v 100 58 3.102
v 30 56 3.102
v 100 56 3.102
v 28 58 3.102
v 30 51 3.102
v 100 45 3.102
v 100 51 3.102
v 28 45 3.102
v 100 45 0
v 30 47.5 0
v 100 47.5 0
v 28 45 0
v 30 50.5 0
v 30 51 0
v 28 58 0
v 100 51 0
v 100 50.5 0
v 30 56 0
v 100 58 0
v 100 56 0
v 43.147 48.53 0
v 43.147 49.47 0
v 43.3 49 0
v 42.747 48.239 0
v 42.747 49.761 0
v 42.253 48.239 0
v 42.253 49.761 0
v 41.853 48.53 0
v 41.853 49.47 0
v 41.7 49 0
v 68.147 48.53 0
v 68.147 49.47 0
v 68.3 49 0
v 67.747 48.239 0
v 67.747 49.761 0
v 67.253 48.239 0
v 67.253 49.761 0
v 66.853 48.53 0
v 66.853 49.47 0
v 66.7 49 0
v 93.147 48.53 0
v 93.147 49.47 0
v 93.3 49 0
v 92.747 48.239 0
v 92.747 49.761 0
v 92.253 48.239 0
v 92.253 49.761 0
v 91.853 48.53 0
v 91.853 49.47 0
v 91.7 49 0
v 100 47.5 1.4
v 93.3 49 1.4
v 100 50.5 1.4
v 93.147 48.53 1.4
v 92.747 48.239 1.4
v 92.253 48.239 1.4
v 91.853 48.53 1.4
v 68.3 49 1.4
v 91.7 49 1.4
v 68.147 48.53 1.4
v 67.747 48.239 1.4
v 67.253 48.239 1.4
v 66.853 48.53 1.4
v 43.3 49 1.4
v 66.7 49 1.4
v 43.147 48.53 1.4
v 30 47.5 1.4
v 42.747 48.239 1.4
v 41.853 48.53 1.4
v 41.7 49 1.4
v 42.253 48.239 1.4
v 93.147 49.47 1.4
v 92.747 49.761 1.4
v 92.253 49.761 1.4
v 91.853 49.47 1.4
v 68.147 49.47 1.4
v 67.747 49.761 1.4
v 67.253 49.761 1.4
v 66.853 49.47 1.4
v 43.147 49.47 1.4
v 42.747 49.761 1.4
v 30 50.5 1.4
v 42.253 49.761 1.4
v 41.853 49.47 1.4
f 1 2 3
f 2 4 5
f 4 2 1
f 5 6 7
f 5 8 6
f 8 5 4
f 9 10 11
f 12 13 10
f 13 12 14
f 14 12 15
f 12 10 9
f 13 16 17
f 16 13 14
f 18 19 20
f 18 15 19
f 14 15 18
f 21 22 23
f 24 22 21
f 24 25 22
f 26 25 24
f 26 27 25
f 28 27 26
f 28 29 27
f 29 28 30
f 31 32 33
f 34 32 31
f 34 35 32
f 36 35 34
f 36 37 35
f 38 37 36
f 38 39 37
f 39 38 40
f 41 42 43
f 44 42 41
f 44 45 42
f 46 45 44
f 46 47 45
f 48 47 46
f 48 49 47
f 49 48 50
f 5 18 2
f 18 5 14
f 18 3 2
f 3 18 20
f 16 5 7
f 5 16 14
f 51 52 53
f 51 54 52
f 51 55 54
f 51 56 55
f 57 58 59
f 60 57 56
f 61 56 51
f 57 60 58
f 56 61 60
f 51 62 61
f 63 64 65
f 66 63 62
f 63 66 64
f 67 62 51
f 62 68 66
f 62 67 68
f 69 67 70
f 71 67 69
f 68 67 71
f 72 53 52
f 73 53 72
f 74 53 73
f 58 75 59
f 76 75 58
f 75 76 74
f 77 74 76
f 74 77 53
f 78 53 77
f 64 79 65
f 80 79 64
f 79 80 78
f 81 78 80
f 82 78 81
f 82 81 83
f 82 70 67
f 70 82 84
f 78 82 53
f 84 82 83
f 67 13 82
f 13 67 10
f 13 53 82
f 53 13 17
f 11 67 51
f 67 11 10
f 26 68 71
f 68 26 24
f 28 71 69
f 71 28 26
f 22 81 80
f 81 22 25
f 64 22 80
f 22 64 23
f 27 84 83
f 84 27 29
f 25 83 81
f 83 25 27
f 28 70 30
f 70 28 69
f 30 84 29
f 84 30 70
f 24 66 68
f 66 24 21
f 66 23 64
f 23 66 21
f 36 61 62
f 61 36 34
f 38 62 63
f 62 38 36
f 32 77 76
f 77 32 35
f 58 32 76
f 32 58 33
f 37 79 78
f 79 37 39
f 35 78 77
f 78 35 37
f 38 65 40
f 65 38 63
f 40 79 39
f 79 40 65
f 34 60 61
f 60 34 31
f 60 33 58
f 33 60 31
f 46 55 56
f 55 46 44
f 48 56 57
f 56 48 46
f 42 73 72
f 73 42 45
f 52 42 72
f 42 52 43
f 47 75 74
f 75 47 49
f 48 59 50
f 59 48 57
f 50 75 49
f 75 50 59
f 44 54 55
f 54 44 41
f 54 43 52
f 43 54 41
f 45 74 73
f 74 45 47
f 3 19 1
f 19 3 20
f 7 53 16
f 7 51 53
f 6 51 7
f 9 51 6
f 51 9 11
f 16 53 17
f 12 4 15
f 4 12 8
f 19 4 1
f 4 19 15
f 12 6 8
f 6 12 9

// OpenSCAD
// file: lib/roundedcube.scad
// Source: https://danielupshaw.com/openscad-rounded-corners/
// Higher definition curves
$fs = 0.01;

module roundedcube(size = [1, 1, 1], center = false, radius = 0.5, apply_to = "all") {
	// If single value, convert to [x, y, z] vector
	size = (size[0] == undef) ? [size, size, size] : size;

	translate_min = radius;
	translate_xmax = size[0] - radius;
	translate_ymax = size[1] - radius;
	translate_zmax = size[2] - radius;

	diameter = radius * 2;

	module build_point(type = "sphere", rotate = [0, 0, 0]) {
		if (type == "sphere") {
			sphere(r = radius);
		} else if (type == "cylinder") {
			rotate(a = rotate)
			cylinder(h = diameter, r = radius, center = true);
		}
	}

	obj_translate = (center == false) ?
		[0, 0, 0] : [
			-(size[0] / 2),
			-(size[1] / 2),
			-(size[2] / 2)
		];

	translate(v = obj_translate) {
		hull() {
			for (translate_x = [translate_min, translate_xmax]) {
				x_at = (translate_x == translate_min) ? "min" : "max";
				for (translate_y = [translate_min, translate_ymax]) {
					y_at = (translate_y == translate_min) ? "min" : "max";
					for (translate_z = [translate_min, translate_zmax]) {
						z_at = (translate_z == translate_min) ? "min" : "max";

						translate(v = [translate_x, translate_y, translate_z])
						if (
							(apply_to == "all") ||
							(apply_to == "xmin" && x_at == "min") || (apply_to == "xmax" && x_at == "max") ||
							(apply_to == "ymin" && y_at == "min") || (apply_to == "ymax" && y_at == "max") ||
							(apply_to == "zmin" && z_at == "min") || (apply_to == "zmax" && z_at == "max")
						) {
							build_point("sphere");
						} else {
							rotate = 
								(apply_to == "xmin" || apply_to == "xmax" || apply_to == "x") ? [0, 90, 0] : (
								(apply_to == "ymin" || apply_to == "ymax" || apply_to == "y") ? [90, 90, 0] :
								[0, 0, 0]
							);
							build_point("cylinder", rotate);
						}
					}
				}
			}
		}
	}
}
// file: common.scad
CORNER_RADIUS = 2;
PANEL_THICKNESS = 1.6;
WIDTH = 150;
INNER_HEIGHT = 62;  // The length of the Teensy board
HEIGHT = INNER_HEIGHT + 2 * PANEL_THICKNESS;

SCREW_HEAD = 3.5; // radius of widest part of screw
SCREW_SHAFT = 1.5; // radius of shaft of screw
SCREW_POSITION_OFFSET = 6;
SCREW_DEPTH = 4;
SCREW1_X = SCREW_POSITION_OFFSET;        SCREW1_Y = SCREW_POSITION_OFFSET;
SCREW2_X = SCREW_POSITION_OFFSET;        SCREW2_Y = HEIGHT- SCREW_POSITION_OFFSET;
SCREW3_X = WIDTH-SCREW_POSITION_OFFSET;  SCREW3_Y = SCREW_POSITION_OFFSET;
SCREW4_X = WIDTH-SCREW_POSITION_OFFSET;  SCREW4_Y = HEIGHT-SCREW_POSITION_OFFSET;

//FIXME 
$fn = 30;
// main file
include <common.scad>
SKIRT_DEPTH = 20;
TOP_THICKNESS = 2*PANEL_THICKNESS;

BUTTON_DIAMETER = 15.7;
ENCODER_DIAMETER = 7.05;
HEADPHONE_DIAMETER = 6 + 0.5; // 0.5mm padding

NEOPIXEL_LEFT_END = 30;
NEOPIXEL_TOP_EDGE = 56;
NEOPIXEL_WIDTH = 5;
NEOPIXEL_LENGTH = 100.5;
NEOPIXEL_RESISTOR_WIDTH = 3;
NEOPIXEL_RESISTOR_DEPTH = 1.4;
NEOPIXEL_RESISTOR_GAP = 0.5;

SLOT_CENTERLINE_X = 21;
SLOT_CENTERLINE_DOWN = 12;
USB_PORT_WIDTH = 8 + 0.5; // 0.5mm padding
USB_PORT_HEIGHT = 3 + 0.5; // 0.5mm padding
MICROSD_WIDTH = 11 + 0.5; // 0.5mm padding 
MICROSD_HEIGHT = 1 + 0.5; // 0.5mm padding
STUD_THICKNESS = SCREW_POSITION_OFFSET+SCREW_HEAD-1;

//FIXME
$fn=10;

use <lib/roundedcube.scad>

module structure() {
    // front panel
    difference() {
        translate([0, 0, -SKIRT_DEPTH]) roundedcube([WIDTH, HEIGHT, TOP_THICKNESS+SKIRT_DEPTH], radius=CORNER_RADIUS, apply_to="zmax");

        translate([PANEL_THICKNESS, PANEL_THICKNESS, -SKIRT_DEPTH]) cube([WIDTH-2*PANEL_THICKNESS, HEIGHT-2*PANEL_THICKNESS, SKIRT_DEPTH]);
    }
}

module button_hole(x, y) {
    // a hole for the button centered at x,y
    translate([x, y, 0])
    cylinder(h=3*TOP_THICKNESS, center=true, r=BUTTON_DIAMETER/2);
}

module buttons() {
    // all the holes for the five buttons
    button_hole(45, 13);
    button_hole(45, 35);
    button_hole(68, 13);
    button_hole(68, 35);
    button_hole(91, 13);
}

module neopixels() {
    // neopixel openings
    translate([NEOPIXEL_LEFT_END, NEOPIXEL_TOP_EDGE - NEOPIXEL_WIDTH, -TOP_THICKNESS])
    cube([NEOPIXEL_LENGTH, NEOPIXEL_WIDTH, 3*TOP_THICKNESS]);

    // resistor notch
    translate([NEOPIXEL_LEFT_END, NEOPIXEL_TOP_EDGE - NEOPIXEL_WIDTH - NEOPIXEL_RESISTOR_GAP - NEOPIXEL_RESISTOR_WIDTH, 0])
    cube([NEOPIXEL_LENGTH, NEOPIXEL_RESISTOR_WIDTH, NEOPIXEL_RESISTOR_DEPTH]);
}

module neopixel_stud(x, y) {
    // mounting stud for neopixel
    translate([x, y, NEOPIXEL_RESISTOR_DEPTH - 2.5]) cylinder(h=4, r=0.8);
}

module neopixel_studs() {
    stud_center = NEOPIXEL_TOP_EDGE - NEOPIXEL_WIDTH - 2;
    post_offset = 12.5;
    neopixel_stud(NEOPIXEL_LEFT_END + post_offset, stud_center);
    neopixel_stud(NEOPIXEL_LEFT_END + post_offset * 3, stud_center);
    neopixel_stud(NEOPIXEL_LEFT_END + post_offset * 5, stud_center);
    neopixel_stud(NEOPIXEL_LEFT_END + post_offset * 7, stud_center);

}

module headphones() {
    translate([WIDTH - 15, 50, -SKIRT_DEPTH / 2])
    rotate([-90, 0, 0])
    cylinder(h=100, r=HEADPHONE_DIAMETER/2);
}

module slots() {
    // USB port on top edge
    translate([SLOT_CENTERLINE_X - USB_PORT_WIDTH/2, 50, -SLOT_CENTERLINE_DOWN - USB_PORT_HEIGHT/2])
    cube([USB_PORT_WIDTH, 100, USB_PORT_HEIGHT]);
    
    //MicroSD on bottom edge
    translate([SLOT_CENTERLINE_X - MICROSD_WIDTH/2, -50, -SLOT_CENTERLINE_DOWN - MICROSD_HEIGHT/2])
    cube([MICROSD_WIDTH, 100, MICROSD_HEIGHT]);
}

module encoder() {
        translate([131, 24, 0]) cylinder(h=3*TOP_THICKNESS, center=true, r=ENCODER_DIAMETER/2);
}

module screw_stud(x, y) {
    translate([x, y, -SKIRT_DEPTH]) cylinder(h=SCREW_DEPTH, r=SCREW_SHAFT-0.1);
}

module case_studs() {
    difference() {
        translate([PANEL_THICKNESS, PANEL_THICKNESS, -SKIRT_DEPTH])
            cube([STUD_THICKNESS, STUD_THICKNESS, SKIRT_DEPTH]);
            
        screw_stud(SCREW1_X, SCREW1_Y);
    }
    
    difference() {
        translate([PANEL_THICKNESS, HEIGHT-PANEL_THICKNESS-STUD_THICKNESS, -SKIRT_DEPTH])
            cube([STUD_THICKNESS, STUD_THICKNESS, SKIRT_DEPTH]);
            
        screw_stud(SCREW2_X, SCREW2_Y);
    }

    difference() {
        translate([WIDTH-PANEL_THICKNESS-STUD_THICKNESS, PANEL_THICKNESS, -SKIRT_DEPTH])
            cube([STUD_THICKNESS, STUD_THICKNESS, SKIRT_DEPTH]);
            
        screw_stud(SCREW3_X, SCREW3_Y);
    }

    difference() {
        translate([WIDTH-PANEL_THICKNESS-STUD_THICKNESS, HEIGHT-PANEL_THICKNESS-STUD_THICKNESS, -SKIRT_DEPTH])
            cube([STUD_THICKNESS, STUD_THICKNESS, SKIRT_DEPTH]);
            
        screw_stud(SCREW4_X, SCREW4_Y);
    }
}

module case() {
    // drill holes
    difference() {
        structure();
        buttons();
        encoder();
        neopixels();
        headphones();
        slots();
    }
    case_studs();
    neopixel_studs();
}
//case();

//Test print
intersection() {
    case();
    translate([28, 45, 0]) cube([72,13,100]);
}


//TODO
// - Add labels
// - Add clips for teensy
// - Add neopixel mount

// encoder button test
//intersection() {
//    case();
//    translate([120, 0, -500]) cube([30, 35, 1000]);
//}

// shave down the neopixel mount STL from Thingiverse
//color("green")
//difference() {
//    import("neopixel_case.stl");
//    translate([-100, -100, 1]) cube([200, 200, 35]);
//}
